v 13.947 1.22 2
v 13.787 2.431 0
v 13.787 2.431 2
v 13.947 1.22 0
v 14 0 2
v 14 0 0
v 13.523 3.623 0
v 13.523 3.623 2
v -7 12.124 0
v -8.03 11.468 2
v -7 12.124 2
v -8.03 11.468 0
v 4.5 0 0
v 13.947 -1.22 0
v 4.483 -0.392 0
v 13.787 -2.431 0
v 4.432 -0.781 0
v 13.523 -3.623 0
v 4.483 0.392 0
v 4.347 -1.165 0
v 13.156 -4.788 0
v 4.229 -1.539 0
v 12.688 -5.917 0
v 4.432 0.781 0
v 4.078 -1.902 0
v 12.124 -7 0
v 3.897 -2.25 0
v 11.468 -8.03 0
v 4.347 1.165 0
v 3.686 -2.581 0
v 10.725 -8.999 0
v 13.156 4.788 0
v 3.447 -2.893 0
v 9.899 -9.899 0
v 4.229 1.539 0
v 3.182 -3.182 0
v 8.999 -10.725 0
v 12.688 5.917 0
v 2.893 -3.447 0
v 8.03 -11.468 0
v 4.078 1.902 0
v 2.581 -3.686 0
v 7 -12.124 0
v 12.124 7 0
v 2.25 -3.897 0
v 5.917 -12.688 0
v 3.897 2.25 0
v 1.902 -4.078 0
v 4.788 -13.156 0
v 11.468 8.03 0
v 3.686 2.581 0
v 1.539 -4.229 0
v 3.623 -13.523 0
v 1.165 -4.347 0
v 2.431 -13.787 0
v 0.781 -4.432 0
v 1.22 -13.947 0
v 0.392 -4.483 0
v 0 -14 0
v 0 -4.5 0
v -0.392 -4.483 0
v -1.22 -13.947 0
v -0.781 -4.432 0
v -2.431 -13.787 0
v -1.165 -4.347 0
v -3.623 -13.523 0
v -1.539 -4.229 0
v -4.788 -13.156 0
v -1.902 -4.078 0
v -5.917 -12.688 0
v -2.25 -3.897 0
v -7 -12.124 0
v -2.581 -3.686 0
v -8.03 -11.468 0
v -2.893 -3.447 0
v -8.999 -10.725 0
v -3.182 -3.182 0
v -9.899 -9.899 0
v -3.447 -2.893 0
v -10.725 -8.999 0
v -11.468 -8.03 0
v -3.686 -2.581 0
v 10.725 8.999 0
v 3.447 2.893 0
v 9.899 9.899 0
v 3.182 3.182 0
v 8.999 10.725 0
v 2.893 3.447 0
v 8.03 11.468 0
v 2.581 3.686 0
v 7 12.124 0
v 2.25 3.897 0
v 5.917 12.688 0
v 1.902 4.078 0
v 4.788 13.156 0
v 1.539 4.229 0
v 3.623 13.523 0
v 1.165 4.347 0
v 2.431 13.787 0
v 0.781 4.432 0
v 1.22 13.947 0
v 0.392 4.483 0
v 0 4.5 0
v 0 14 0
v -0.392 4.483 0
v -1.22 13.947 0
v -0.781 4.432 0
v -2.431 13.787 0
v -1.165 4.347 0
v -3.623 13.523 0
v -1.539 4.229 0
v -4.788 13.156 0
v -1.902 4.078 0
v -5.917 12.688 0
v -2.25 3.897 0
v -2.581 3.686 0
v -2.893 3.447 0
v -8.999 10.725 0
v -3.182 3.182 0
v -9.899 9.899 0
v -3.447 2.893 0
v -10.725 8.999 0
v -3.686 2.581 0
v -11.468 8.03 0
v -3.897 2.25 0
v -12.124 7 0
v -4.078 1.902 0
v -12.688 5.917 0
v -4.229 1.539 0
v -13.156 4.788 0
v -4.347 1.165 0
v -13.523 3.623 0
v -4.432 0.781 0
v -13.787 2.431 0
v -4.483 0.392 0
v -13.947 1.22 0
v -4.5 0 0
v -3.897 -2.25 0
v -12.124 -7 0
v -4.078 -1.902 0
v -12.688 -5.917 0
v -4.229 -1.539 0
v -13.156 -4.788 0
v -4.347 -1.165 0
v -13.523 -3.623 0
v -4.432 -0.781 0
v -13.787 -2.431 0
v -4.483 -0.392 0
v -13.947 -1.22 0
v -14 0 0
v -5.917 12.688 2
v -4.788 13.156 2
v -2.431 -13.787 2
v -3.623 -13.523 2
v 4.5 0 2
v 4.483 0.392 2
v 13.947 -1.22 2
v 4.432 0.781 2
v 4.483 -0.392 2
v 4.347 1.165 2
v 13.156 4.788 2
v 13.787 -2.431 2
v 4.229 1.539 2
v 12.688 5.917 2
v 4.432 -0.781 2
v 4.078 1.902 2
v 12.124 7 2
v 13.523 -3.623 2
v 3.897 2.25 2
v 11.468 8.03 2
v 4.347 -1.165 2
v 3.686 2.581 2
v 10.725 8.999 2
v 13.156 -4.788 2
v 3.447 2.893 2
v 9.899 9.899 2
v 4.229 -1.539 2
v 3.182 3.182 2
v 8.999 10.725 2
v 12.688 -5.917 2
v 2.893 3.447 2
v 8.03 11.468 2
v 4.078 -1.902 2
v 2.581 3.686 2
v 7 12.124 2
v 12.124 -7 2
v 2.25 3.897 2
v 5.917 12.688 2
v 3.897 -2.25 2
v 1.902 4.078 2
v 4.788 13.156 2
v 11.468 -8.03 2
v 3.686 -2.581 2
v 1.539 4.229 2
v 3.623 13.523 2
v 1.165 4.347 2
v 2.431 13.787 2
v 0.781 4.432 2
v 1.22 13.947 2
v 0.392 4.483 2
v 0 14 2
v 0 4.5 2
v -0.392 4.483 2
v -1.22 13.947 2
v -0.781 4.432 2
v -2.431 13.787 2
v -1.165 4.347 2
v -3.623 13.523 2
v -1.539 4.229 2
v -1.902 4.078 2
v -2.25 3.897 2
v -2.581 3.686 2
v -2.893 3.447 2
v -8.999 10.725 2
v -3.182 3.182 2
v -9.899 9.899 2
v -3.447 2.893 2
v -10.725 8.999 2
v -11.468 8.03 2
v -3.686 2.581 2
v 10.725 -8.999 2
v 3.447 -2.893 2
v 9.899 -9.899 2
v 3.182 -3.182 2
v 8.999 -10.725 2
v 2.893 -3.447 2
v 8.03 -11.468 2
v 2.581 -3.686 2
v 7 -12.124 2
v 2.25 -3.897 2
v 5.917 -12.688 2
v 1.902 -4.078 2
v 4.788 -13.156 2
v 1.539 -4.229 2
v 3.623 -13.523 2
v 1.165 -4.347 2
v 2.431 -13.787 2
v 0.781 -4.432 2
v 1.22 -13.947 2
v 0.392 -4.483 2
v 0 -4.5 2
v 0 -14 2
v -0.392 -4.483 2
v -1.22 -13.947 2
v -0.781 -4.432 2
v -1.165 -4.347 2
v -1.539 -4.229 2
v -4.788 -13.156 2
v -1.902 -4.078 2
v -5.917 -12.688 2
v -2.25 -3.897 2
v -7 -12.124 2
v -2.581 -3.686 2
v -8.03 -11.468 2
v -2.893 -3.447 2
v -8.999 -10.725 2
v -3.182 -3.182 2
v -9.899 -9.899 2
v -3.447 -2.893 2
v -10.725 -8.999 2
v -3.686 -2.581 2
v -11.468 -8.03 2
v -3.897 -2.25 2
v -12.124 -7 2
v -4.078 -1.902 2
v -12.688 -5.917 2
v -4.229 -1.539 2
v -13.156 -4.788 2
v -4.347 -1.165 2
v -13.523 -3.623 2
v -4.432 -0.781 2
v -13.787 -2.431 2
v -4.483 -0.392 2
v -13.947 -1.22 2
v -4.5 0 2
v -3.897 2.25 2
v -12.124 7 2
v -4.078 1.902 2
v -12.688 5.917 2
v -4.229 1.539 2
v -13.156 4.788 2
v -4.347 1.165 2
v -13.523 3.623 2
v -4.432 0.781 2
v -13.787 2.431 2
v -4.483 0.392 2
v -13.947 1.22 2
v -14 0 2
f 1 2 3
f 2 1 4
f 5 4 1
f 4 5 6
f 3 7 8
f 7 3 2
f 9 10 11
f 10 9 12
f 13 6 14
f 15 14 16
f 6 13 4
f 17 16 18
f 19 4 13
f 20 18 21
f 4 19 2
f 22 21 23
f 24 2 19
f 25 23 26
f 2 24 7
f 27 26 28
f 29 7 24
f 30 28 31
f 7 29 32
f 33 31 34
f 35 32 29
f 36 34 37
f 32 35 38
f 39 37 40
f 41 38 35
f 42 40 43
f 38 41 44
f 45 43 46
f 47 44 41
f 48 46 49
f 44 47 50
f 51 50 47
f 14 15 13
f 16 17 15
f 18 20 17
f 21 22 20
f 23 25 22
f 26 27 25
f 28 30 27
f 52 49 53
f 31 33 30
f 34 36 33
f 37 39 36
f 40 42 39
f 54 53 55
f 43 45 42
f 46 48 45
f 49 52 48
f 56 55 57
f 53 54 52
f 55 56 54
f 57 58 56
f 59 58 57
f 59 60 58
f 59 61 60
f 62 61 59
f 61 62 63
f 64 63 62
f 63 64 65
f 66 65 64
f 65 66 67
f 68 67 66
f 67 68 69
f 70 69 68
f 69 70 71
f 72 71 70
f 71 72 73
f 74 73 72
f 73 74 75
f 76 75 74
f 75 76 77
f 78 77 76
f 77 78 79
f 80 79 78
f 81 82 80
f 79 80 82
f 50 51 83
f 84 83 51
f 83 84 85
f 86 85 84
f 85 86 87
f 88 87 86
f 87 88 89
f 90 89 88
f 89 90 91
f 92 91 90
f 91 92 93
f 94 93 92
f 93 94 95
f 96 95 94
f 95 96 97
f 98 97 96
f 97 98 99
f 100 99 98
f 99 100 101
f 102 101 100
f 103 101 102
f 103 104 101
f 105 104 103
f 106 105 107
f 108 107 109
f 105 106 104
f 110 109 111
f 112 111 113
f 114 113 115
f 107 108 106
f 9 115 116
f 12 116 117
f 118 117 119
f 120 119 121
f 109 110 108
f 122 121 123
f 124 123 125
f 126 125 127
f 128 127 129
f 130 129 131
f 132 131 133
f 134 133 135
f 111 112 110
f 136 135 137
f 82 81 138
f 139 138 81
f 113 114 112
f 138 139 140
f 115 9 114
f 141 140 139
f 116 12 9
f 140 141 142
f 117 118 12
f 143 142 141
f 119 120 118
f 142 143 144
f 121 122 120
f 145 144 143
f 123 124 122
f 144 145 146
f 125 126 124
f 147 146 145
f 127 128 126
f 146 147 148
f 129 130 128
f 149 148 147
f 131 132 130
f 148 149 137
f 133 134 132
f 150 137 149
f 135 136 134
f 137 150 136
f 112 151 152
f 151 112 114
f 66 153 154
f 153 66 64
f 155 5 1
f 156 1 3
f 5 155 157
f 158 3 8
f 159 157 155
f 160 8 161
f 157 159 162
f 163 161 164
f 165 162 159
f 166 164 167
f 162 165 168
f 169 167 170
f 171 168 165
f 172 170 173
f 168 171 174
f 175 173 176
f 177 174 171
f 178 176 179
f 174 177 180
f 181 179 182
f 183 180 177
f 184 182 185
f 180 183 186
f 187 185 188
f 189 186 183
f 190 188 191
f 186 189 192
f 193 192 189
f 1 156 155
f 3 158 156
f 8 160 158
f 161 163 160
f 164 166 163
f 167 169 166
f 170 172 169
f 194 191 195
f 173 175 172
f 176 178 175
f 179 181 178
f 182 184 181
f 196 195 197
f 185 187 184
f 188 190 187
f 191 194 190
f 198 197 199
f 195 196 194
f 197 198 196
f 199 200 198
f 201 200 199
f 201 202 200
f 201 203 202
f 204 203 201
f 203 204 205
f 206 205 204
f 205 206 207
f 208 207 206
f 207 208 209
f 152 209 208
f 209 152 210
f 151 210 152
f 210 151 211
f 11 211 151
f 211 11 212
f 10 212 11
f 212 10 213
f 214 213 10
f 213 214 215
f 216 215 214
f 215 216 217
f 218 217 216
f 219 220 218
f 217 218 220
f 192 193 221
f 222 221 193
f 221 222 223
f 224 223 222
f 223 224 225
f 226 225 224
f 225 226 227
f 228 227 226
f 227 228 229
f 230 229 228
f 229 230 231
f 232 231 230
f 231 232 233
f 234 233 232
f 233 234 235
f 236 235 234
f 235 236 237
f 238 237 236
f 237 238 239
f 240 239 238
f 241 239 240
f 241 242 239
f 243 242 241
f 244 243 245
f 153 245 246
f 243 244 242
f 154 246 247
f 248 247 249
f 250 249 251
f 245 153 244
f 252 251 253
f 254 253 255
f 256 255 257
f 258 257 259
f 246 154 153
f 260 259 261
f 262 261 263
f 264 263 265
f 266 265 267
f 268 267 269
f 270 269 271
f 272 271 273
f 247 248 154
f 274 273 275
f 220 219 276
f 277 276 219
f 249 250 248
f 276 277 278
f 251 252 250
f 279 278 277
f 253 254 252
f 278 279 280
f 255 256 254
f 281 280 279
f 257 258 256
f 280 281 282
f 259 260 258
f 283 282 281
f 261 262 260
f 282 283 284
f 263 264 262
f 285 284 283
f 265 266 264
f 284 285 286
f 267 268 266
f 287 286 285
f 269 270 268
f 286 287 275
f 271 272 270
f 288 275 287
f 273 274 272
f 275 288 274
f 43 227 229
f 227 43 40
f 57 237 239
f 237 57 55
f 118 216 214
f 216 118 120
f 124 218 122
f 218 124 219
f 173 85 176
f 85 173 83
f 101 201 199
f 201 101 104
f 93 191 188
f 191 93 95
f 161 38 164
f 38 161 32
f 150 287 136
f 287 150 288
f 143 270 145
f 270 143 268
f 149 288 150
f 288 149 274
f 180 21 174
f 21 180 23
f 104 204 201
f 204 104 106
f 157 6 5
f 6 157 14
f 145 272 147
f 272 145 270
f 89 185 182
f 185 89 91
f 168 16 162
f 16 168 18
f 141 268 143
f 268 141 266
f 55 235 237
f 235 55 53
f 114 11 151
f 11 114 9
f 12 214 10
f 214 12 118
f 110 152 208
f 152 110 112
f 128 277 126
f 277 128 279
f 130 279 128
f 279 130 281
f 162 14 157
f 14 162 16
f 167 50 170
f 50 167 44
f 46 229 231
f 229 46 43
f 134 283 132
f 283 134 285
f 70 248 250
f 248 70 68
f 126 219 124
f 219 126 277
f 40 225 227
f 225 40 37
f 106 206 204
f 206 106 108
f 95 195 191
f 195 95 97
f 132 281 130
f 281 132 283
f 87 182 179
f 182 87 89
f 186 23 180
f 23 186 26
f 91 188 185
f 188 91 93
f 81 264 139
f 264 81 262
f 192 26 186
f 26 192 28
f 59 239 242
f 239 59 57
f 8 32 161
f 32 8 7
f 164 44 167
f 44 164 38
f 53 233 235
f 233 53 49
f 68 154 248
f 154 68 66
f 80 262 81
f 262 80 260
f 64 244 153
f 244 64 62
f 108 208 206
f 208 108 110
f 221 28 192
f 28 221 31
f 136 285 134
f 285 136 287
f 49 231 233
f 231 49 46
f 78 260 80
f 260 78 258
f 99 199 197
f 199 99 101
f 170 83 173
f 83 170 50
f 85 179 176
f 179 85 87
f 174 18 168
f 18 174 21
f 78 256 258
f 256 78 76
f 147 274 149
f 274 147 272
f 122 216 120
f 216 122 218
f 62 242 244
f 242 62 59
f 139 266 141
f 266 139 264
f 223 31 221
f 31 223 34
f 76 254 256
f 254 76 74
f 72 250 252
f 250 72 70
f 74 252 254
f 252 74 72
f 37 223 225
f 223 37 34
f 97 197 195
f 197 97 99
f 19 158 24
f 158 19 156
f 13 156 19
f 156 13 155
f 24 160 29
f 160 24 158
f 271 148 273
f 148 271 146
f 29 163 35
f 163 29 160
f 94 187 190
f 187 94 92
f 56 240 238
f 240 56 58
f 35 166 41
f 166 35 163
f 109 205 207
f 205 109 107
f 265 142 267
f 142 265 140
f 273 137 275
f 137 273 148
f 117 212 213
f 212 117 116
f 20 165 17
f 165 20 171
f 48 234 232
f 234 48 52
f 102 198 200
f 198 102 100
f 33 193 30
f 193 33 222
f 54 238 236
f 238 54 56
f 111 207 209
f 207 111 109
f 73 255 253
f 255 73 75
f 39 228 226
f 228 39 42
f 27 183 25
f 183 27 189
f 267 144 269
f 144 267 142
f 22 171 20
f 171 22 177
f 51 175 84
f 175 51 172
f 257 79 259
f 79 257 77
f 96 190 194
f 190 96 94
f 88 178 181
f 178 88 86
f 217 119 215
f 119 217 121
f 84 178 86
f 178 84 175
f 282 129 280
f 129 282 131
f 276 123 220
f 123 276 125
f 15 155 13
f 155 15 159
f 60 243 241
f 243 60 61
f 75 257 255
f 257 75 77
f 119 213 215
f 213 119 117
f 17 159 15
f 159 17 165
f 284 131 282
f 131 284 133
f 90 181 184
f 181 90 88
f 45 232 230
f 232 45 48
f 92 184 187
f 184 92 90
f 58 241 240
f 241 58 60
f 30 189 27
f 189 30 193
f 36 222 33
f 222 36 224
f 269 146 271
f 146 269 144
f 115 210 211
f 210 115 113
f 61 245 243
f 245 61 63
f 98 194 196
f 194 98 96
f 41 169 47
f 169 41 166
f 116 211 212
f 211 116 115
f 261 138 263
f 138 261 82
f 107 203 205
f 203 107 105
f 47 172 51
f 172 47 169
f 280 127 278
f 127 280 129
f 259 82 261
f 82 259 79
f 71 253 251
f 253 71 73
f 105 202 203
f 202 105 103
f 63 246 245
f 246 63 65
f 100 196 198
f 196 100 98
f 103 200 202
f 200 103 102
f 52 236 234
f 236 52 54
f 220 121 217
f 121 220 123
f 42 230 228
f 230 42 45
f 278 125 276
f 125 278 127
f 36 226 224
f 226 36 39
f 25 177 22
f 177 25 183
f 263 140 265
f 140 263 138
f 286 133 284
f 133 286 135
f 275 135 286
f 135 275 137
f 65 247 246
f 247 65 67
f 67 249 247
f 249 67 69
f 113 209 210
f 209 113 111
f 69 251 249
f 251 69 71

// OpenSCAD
// file: parameters.scad
// Coax Faraday Generator Experiments v3 — shared parameters (mm)
// Three-layer coaxial: outer magnets + coil stator + inner magnets
// Orthodox Faraday only — mechanical → electrical. No overunity.
// Target: Anycubic Kobra 3 Max, 0.4 mm nozzle, 0.2 mm layers, PETG preferred.

$fn = 72;

// --- Printer / FDM ---
nozzle = 0.4;
layer = 0.2;
wall = 2.0;                 // ≥2 mm walls on drums
housing_wall = 2.4;
clearance_slip = 0.35;
press_interference = 0.15;  // 608 seat undersize total (~0.1–0.2)
magnet_pocket_xy = 0.25;    // +0.25 mm on diameter (within +0.2–0.3)
magnet_pocket_z = 0.15;     // +0.15 mm depth (within +0.1–0.2)

// --- Magnets (ASSUMPTION: Ø20×5 mm N42 axial discs, not bar stock) ---
magnet_d = 20;
magnet_h = 5;
pole_count = 8;             // alternating N/S around circumference

// --- Radial stack (from axis) ---
// Inner magnet FACE at r=33; magnets 5 mm thick → pocket floor at 33-5=28
r_inner_face = 33;
air_gap = 2.0;              // each side (1–3 mm sweep; nominal 2)
coil_radial = 9.0;          // winding depth
r_coil_inner = r_inner_face + air_gap;          // 35
r_coil_outer = r_coil_inner + coil_radial;      // 44
r_outer_face = r_coil_outer + air_gap;          // 46
// Outer magnet pocket floor (further out): face + thickness
r_outer_floor = r_outer_face + magnet_h;        // 51

inner_drum_od = 2 * (r_inner_face);             // face OD before pockets nuance
inner_drum_core_r = r_inner_face - magnet_h;    // 28
outer_drum_id = 2 * r_outer_face;               // clear to faces
outer_drum_od = 2 * (r_outer_floor + wall);     // ~106

axial_magnet = 22;          // pocket axial span (~magnet_d + margin)
coil_axial = 24;
drum_axial = 28;            // outer/inner drum barrel length

// --- Shaft / bearings 608-2RS ---
shaft_d = 8;
bearing_od = 22;
bearing_id = 8;
bearing_h = 7;
bearing_seat_od = bearing_od - press_interference; // ~21.85

// --- Base ---
base_w = 160;
base_d = 140;
base_h = 8;
post_h = 70;
post_spacing = 100;         // bearing center distance along shaft axis (Y)
post_d = 36;

// --- Crank ---
crank_arm_len = 80;
crank_arm_w = 16;
crank_arm_t = 10;
handle_d = 14;
handle_len = 40;

// --- Fasteners ---
m3_clear = 3.4;
m3_tap = 2.5;
m4_clear = 4.3;
// main file
include <parameters.scad>

// Axial spacer / shim between hub and drum — set THICKNESS via -D
thickness = 2.0;
module spacer_ring() {
    difference() {
        cylinder(h = thickness, d = 28);
        translate([0, 0, -0.1]) cylinder(h = thickness + 0.2, d = shaft_d + 1);
    }
}
spacer_ring();
